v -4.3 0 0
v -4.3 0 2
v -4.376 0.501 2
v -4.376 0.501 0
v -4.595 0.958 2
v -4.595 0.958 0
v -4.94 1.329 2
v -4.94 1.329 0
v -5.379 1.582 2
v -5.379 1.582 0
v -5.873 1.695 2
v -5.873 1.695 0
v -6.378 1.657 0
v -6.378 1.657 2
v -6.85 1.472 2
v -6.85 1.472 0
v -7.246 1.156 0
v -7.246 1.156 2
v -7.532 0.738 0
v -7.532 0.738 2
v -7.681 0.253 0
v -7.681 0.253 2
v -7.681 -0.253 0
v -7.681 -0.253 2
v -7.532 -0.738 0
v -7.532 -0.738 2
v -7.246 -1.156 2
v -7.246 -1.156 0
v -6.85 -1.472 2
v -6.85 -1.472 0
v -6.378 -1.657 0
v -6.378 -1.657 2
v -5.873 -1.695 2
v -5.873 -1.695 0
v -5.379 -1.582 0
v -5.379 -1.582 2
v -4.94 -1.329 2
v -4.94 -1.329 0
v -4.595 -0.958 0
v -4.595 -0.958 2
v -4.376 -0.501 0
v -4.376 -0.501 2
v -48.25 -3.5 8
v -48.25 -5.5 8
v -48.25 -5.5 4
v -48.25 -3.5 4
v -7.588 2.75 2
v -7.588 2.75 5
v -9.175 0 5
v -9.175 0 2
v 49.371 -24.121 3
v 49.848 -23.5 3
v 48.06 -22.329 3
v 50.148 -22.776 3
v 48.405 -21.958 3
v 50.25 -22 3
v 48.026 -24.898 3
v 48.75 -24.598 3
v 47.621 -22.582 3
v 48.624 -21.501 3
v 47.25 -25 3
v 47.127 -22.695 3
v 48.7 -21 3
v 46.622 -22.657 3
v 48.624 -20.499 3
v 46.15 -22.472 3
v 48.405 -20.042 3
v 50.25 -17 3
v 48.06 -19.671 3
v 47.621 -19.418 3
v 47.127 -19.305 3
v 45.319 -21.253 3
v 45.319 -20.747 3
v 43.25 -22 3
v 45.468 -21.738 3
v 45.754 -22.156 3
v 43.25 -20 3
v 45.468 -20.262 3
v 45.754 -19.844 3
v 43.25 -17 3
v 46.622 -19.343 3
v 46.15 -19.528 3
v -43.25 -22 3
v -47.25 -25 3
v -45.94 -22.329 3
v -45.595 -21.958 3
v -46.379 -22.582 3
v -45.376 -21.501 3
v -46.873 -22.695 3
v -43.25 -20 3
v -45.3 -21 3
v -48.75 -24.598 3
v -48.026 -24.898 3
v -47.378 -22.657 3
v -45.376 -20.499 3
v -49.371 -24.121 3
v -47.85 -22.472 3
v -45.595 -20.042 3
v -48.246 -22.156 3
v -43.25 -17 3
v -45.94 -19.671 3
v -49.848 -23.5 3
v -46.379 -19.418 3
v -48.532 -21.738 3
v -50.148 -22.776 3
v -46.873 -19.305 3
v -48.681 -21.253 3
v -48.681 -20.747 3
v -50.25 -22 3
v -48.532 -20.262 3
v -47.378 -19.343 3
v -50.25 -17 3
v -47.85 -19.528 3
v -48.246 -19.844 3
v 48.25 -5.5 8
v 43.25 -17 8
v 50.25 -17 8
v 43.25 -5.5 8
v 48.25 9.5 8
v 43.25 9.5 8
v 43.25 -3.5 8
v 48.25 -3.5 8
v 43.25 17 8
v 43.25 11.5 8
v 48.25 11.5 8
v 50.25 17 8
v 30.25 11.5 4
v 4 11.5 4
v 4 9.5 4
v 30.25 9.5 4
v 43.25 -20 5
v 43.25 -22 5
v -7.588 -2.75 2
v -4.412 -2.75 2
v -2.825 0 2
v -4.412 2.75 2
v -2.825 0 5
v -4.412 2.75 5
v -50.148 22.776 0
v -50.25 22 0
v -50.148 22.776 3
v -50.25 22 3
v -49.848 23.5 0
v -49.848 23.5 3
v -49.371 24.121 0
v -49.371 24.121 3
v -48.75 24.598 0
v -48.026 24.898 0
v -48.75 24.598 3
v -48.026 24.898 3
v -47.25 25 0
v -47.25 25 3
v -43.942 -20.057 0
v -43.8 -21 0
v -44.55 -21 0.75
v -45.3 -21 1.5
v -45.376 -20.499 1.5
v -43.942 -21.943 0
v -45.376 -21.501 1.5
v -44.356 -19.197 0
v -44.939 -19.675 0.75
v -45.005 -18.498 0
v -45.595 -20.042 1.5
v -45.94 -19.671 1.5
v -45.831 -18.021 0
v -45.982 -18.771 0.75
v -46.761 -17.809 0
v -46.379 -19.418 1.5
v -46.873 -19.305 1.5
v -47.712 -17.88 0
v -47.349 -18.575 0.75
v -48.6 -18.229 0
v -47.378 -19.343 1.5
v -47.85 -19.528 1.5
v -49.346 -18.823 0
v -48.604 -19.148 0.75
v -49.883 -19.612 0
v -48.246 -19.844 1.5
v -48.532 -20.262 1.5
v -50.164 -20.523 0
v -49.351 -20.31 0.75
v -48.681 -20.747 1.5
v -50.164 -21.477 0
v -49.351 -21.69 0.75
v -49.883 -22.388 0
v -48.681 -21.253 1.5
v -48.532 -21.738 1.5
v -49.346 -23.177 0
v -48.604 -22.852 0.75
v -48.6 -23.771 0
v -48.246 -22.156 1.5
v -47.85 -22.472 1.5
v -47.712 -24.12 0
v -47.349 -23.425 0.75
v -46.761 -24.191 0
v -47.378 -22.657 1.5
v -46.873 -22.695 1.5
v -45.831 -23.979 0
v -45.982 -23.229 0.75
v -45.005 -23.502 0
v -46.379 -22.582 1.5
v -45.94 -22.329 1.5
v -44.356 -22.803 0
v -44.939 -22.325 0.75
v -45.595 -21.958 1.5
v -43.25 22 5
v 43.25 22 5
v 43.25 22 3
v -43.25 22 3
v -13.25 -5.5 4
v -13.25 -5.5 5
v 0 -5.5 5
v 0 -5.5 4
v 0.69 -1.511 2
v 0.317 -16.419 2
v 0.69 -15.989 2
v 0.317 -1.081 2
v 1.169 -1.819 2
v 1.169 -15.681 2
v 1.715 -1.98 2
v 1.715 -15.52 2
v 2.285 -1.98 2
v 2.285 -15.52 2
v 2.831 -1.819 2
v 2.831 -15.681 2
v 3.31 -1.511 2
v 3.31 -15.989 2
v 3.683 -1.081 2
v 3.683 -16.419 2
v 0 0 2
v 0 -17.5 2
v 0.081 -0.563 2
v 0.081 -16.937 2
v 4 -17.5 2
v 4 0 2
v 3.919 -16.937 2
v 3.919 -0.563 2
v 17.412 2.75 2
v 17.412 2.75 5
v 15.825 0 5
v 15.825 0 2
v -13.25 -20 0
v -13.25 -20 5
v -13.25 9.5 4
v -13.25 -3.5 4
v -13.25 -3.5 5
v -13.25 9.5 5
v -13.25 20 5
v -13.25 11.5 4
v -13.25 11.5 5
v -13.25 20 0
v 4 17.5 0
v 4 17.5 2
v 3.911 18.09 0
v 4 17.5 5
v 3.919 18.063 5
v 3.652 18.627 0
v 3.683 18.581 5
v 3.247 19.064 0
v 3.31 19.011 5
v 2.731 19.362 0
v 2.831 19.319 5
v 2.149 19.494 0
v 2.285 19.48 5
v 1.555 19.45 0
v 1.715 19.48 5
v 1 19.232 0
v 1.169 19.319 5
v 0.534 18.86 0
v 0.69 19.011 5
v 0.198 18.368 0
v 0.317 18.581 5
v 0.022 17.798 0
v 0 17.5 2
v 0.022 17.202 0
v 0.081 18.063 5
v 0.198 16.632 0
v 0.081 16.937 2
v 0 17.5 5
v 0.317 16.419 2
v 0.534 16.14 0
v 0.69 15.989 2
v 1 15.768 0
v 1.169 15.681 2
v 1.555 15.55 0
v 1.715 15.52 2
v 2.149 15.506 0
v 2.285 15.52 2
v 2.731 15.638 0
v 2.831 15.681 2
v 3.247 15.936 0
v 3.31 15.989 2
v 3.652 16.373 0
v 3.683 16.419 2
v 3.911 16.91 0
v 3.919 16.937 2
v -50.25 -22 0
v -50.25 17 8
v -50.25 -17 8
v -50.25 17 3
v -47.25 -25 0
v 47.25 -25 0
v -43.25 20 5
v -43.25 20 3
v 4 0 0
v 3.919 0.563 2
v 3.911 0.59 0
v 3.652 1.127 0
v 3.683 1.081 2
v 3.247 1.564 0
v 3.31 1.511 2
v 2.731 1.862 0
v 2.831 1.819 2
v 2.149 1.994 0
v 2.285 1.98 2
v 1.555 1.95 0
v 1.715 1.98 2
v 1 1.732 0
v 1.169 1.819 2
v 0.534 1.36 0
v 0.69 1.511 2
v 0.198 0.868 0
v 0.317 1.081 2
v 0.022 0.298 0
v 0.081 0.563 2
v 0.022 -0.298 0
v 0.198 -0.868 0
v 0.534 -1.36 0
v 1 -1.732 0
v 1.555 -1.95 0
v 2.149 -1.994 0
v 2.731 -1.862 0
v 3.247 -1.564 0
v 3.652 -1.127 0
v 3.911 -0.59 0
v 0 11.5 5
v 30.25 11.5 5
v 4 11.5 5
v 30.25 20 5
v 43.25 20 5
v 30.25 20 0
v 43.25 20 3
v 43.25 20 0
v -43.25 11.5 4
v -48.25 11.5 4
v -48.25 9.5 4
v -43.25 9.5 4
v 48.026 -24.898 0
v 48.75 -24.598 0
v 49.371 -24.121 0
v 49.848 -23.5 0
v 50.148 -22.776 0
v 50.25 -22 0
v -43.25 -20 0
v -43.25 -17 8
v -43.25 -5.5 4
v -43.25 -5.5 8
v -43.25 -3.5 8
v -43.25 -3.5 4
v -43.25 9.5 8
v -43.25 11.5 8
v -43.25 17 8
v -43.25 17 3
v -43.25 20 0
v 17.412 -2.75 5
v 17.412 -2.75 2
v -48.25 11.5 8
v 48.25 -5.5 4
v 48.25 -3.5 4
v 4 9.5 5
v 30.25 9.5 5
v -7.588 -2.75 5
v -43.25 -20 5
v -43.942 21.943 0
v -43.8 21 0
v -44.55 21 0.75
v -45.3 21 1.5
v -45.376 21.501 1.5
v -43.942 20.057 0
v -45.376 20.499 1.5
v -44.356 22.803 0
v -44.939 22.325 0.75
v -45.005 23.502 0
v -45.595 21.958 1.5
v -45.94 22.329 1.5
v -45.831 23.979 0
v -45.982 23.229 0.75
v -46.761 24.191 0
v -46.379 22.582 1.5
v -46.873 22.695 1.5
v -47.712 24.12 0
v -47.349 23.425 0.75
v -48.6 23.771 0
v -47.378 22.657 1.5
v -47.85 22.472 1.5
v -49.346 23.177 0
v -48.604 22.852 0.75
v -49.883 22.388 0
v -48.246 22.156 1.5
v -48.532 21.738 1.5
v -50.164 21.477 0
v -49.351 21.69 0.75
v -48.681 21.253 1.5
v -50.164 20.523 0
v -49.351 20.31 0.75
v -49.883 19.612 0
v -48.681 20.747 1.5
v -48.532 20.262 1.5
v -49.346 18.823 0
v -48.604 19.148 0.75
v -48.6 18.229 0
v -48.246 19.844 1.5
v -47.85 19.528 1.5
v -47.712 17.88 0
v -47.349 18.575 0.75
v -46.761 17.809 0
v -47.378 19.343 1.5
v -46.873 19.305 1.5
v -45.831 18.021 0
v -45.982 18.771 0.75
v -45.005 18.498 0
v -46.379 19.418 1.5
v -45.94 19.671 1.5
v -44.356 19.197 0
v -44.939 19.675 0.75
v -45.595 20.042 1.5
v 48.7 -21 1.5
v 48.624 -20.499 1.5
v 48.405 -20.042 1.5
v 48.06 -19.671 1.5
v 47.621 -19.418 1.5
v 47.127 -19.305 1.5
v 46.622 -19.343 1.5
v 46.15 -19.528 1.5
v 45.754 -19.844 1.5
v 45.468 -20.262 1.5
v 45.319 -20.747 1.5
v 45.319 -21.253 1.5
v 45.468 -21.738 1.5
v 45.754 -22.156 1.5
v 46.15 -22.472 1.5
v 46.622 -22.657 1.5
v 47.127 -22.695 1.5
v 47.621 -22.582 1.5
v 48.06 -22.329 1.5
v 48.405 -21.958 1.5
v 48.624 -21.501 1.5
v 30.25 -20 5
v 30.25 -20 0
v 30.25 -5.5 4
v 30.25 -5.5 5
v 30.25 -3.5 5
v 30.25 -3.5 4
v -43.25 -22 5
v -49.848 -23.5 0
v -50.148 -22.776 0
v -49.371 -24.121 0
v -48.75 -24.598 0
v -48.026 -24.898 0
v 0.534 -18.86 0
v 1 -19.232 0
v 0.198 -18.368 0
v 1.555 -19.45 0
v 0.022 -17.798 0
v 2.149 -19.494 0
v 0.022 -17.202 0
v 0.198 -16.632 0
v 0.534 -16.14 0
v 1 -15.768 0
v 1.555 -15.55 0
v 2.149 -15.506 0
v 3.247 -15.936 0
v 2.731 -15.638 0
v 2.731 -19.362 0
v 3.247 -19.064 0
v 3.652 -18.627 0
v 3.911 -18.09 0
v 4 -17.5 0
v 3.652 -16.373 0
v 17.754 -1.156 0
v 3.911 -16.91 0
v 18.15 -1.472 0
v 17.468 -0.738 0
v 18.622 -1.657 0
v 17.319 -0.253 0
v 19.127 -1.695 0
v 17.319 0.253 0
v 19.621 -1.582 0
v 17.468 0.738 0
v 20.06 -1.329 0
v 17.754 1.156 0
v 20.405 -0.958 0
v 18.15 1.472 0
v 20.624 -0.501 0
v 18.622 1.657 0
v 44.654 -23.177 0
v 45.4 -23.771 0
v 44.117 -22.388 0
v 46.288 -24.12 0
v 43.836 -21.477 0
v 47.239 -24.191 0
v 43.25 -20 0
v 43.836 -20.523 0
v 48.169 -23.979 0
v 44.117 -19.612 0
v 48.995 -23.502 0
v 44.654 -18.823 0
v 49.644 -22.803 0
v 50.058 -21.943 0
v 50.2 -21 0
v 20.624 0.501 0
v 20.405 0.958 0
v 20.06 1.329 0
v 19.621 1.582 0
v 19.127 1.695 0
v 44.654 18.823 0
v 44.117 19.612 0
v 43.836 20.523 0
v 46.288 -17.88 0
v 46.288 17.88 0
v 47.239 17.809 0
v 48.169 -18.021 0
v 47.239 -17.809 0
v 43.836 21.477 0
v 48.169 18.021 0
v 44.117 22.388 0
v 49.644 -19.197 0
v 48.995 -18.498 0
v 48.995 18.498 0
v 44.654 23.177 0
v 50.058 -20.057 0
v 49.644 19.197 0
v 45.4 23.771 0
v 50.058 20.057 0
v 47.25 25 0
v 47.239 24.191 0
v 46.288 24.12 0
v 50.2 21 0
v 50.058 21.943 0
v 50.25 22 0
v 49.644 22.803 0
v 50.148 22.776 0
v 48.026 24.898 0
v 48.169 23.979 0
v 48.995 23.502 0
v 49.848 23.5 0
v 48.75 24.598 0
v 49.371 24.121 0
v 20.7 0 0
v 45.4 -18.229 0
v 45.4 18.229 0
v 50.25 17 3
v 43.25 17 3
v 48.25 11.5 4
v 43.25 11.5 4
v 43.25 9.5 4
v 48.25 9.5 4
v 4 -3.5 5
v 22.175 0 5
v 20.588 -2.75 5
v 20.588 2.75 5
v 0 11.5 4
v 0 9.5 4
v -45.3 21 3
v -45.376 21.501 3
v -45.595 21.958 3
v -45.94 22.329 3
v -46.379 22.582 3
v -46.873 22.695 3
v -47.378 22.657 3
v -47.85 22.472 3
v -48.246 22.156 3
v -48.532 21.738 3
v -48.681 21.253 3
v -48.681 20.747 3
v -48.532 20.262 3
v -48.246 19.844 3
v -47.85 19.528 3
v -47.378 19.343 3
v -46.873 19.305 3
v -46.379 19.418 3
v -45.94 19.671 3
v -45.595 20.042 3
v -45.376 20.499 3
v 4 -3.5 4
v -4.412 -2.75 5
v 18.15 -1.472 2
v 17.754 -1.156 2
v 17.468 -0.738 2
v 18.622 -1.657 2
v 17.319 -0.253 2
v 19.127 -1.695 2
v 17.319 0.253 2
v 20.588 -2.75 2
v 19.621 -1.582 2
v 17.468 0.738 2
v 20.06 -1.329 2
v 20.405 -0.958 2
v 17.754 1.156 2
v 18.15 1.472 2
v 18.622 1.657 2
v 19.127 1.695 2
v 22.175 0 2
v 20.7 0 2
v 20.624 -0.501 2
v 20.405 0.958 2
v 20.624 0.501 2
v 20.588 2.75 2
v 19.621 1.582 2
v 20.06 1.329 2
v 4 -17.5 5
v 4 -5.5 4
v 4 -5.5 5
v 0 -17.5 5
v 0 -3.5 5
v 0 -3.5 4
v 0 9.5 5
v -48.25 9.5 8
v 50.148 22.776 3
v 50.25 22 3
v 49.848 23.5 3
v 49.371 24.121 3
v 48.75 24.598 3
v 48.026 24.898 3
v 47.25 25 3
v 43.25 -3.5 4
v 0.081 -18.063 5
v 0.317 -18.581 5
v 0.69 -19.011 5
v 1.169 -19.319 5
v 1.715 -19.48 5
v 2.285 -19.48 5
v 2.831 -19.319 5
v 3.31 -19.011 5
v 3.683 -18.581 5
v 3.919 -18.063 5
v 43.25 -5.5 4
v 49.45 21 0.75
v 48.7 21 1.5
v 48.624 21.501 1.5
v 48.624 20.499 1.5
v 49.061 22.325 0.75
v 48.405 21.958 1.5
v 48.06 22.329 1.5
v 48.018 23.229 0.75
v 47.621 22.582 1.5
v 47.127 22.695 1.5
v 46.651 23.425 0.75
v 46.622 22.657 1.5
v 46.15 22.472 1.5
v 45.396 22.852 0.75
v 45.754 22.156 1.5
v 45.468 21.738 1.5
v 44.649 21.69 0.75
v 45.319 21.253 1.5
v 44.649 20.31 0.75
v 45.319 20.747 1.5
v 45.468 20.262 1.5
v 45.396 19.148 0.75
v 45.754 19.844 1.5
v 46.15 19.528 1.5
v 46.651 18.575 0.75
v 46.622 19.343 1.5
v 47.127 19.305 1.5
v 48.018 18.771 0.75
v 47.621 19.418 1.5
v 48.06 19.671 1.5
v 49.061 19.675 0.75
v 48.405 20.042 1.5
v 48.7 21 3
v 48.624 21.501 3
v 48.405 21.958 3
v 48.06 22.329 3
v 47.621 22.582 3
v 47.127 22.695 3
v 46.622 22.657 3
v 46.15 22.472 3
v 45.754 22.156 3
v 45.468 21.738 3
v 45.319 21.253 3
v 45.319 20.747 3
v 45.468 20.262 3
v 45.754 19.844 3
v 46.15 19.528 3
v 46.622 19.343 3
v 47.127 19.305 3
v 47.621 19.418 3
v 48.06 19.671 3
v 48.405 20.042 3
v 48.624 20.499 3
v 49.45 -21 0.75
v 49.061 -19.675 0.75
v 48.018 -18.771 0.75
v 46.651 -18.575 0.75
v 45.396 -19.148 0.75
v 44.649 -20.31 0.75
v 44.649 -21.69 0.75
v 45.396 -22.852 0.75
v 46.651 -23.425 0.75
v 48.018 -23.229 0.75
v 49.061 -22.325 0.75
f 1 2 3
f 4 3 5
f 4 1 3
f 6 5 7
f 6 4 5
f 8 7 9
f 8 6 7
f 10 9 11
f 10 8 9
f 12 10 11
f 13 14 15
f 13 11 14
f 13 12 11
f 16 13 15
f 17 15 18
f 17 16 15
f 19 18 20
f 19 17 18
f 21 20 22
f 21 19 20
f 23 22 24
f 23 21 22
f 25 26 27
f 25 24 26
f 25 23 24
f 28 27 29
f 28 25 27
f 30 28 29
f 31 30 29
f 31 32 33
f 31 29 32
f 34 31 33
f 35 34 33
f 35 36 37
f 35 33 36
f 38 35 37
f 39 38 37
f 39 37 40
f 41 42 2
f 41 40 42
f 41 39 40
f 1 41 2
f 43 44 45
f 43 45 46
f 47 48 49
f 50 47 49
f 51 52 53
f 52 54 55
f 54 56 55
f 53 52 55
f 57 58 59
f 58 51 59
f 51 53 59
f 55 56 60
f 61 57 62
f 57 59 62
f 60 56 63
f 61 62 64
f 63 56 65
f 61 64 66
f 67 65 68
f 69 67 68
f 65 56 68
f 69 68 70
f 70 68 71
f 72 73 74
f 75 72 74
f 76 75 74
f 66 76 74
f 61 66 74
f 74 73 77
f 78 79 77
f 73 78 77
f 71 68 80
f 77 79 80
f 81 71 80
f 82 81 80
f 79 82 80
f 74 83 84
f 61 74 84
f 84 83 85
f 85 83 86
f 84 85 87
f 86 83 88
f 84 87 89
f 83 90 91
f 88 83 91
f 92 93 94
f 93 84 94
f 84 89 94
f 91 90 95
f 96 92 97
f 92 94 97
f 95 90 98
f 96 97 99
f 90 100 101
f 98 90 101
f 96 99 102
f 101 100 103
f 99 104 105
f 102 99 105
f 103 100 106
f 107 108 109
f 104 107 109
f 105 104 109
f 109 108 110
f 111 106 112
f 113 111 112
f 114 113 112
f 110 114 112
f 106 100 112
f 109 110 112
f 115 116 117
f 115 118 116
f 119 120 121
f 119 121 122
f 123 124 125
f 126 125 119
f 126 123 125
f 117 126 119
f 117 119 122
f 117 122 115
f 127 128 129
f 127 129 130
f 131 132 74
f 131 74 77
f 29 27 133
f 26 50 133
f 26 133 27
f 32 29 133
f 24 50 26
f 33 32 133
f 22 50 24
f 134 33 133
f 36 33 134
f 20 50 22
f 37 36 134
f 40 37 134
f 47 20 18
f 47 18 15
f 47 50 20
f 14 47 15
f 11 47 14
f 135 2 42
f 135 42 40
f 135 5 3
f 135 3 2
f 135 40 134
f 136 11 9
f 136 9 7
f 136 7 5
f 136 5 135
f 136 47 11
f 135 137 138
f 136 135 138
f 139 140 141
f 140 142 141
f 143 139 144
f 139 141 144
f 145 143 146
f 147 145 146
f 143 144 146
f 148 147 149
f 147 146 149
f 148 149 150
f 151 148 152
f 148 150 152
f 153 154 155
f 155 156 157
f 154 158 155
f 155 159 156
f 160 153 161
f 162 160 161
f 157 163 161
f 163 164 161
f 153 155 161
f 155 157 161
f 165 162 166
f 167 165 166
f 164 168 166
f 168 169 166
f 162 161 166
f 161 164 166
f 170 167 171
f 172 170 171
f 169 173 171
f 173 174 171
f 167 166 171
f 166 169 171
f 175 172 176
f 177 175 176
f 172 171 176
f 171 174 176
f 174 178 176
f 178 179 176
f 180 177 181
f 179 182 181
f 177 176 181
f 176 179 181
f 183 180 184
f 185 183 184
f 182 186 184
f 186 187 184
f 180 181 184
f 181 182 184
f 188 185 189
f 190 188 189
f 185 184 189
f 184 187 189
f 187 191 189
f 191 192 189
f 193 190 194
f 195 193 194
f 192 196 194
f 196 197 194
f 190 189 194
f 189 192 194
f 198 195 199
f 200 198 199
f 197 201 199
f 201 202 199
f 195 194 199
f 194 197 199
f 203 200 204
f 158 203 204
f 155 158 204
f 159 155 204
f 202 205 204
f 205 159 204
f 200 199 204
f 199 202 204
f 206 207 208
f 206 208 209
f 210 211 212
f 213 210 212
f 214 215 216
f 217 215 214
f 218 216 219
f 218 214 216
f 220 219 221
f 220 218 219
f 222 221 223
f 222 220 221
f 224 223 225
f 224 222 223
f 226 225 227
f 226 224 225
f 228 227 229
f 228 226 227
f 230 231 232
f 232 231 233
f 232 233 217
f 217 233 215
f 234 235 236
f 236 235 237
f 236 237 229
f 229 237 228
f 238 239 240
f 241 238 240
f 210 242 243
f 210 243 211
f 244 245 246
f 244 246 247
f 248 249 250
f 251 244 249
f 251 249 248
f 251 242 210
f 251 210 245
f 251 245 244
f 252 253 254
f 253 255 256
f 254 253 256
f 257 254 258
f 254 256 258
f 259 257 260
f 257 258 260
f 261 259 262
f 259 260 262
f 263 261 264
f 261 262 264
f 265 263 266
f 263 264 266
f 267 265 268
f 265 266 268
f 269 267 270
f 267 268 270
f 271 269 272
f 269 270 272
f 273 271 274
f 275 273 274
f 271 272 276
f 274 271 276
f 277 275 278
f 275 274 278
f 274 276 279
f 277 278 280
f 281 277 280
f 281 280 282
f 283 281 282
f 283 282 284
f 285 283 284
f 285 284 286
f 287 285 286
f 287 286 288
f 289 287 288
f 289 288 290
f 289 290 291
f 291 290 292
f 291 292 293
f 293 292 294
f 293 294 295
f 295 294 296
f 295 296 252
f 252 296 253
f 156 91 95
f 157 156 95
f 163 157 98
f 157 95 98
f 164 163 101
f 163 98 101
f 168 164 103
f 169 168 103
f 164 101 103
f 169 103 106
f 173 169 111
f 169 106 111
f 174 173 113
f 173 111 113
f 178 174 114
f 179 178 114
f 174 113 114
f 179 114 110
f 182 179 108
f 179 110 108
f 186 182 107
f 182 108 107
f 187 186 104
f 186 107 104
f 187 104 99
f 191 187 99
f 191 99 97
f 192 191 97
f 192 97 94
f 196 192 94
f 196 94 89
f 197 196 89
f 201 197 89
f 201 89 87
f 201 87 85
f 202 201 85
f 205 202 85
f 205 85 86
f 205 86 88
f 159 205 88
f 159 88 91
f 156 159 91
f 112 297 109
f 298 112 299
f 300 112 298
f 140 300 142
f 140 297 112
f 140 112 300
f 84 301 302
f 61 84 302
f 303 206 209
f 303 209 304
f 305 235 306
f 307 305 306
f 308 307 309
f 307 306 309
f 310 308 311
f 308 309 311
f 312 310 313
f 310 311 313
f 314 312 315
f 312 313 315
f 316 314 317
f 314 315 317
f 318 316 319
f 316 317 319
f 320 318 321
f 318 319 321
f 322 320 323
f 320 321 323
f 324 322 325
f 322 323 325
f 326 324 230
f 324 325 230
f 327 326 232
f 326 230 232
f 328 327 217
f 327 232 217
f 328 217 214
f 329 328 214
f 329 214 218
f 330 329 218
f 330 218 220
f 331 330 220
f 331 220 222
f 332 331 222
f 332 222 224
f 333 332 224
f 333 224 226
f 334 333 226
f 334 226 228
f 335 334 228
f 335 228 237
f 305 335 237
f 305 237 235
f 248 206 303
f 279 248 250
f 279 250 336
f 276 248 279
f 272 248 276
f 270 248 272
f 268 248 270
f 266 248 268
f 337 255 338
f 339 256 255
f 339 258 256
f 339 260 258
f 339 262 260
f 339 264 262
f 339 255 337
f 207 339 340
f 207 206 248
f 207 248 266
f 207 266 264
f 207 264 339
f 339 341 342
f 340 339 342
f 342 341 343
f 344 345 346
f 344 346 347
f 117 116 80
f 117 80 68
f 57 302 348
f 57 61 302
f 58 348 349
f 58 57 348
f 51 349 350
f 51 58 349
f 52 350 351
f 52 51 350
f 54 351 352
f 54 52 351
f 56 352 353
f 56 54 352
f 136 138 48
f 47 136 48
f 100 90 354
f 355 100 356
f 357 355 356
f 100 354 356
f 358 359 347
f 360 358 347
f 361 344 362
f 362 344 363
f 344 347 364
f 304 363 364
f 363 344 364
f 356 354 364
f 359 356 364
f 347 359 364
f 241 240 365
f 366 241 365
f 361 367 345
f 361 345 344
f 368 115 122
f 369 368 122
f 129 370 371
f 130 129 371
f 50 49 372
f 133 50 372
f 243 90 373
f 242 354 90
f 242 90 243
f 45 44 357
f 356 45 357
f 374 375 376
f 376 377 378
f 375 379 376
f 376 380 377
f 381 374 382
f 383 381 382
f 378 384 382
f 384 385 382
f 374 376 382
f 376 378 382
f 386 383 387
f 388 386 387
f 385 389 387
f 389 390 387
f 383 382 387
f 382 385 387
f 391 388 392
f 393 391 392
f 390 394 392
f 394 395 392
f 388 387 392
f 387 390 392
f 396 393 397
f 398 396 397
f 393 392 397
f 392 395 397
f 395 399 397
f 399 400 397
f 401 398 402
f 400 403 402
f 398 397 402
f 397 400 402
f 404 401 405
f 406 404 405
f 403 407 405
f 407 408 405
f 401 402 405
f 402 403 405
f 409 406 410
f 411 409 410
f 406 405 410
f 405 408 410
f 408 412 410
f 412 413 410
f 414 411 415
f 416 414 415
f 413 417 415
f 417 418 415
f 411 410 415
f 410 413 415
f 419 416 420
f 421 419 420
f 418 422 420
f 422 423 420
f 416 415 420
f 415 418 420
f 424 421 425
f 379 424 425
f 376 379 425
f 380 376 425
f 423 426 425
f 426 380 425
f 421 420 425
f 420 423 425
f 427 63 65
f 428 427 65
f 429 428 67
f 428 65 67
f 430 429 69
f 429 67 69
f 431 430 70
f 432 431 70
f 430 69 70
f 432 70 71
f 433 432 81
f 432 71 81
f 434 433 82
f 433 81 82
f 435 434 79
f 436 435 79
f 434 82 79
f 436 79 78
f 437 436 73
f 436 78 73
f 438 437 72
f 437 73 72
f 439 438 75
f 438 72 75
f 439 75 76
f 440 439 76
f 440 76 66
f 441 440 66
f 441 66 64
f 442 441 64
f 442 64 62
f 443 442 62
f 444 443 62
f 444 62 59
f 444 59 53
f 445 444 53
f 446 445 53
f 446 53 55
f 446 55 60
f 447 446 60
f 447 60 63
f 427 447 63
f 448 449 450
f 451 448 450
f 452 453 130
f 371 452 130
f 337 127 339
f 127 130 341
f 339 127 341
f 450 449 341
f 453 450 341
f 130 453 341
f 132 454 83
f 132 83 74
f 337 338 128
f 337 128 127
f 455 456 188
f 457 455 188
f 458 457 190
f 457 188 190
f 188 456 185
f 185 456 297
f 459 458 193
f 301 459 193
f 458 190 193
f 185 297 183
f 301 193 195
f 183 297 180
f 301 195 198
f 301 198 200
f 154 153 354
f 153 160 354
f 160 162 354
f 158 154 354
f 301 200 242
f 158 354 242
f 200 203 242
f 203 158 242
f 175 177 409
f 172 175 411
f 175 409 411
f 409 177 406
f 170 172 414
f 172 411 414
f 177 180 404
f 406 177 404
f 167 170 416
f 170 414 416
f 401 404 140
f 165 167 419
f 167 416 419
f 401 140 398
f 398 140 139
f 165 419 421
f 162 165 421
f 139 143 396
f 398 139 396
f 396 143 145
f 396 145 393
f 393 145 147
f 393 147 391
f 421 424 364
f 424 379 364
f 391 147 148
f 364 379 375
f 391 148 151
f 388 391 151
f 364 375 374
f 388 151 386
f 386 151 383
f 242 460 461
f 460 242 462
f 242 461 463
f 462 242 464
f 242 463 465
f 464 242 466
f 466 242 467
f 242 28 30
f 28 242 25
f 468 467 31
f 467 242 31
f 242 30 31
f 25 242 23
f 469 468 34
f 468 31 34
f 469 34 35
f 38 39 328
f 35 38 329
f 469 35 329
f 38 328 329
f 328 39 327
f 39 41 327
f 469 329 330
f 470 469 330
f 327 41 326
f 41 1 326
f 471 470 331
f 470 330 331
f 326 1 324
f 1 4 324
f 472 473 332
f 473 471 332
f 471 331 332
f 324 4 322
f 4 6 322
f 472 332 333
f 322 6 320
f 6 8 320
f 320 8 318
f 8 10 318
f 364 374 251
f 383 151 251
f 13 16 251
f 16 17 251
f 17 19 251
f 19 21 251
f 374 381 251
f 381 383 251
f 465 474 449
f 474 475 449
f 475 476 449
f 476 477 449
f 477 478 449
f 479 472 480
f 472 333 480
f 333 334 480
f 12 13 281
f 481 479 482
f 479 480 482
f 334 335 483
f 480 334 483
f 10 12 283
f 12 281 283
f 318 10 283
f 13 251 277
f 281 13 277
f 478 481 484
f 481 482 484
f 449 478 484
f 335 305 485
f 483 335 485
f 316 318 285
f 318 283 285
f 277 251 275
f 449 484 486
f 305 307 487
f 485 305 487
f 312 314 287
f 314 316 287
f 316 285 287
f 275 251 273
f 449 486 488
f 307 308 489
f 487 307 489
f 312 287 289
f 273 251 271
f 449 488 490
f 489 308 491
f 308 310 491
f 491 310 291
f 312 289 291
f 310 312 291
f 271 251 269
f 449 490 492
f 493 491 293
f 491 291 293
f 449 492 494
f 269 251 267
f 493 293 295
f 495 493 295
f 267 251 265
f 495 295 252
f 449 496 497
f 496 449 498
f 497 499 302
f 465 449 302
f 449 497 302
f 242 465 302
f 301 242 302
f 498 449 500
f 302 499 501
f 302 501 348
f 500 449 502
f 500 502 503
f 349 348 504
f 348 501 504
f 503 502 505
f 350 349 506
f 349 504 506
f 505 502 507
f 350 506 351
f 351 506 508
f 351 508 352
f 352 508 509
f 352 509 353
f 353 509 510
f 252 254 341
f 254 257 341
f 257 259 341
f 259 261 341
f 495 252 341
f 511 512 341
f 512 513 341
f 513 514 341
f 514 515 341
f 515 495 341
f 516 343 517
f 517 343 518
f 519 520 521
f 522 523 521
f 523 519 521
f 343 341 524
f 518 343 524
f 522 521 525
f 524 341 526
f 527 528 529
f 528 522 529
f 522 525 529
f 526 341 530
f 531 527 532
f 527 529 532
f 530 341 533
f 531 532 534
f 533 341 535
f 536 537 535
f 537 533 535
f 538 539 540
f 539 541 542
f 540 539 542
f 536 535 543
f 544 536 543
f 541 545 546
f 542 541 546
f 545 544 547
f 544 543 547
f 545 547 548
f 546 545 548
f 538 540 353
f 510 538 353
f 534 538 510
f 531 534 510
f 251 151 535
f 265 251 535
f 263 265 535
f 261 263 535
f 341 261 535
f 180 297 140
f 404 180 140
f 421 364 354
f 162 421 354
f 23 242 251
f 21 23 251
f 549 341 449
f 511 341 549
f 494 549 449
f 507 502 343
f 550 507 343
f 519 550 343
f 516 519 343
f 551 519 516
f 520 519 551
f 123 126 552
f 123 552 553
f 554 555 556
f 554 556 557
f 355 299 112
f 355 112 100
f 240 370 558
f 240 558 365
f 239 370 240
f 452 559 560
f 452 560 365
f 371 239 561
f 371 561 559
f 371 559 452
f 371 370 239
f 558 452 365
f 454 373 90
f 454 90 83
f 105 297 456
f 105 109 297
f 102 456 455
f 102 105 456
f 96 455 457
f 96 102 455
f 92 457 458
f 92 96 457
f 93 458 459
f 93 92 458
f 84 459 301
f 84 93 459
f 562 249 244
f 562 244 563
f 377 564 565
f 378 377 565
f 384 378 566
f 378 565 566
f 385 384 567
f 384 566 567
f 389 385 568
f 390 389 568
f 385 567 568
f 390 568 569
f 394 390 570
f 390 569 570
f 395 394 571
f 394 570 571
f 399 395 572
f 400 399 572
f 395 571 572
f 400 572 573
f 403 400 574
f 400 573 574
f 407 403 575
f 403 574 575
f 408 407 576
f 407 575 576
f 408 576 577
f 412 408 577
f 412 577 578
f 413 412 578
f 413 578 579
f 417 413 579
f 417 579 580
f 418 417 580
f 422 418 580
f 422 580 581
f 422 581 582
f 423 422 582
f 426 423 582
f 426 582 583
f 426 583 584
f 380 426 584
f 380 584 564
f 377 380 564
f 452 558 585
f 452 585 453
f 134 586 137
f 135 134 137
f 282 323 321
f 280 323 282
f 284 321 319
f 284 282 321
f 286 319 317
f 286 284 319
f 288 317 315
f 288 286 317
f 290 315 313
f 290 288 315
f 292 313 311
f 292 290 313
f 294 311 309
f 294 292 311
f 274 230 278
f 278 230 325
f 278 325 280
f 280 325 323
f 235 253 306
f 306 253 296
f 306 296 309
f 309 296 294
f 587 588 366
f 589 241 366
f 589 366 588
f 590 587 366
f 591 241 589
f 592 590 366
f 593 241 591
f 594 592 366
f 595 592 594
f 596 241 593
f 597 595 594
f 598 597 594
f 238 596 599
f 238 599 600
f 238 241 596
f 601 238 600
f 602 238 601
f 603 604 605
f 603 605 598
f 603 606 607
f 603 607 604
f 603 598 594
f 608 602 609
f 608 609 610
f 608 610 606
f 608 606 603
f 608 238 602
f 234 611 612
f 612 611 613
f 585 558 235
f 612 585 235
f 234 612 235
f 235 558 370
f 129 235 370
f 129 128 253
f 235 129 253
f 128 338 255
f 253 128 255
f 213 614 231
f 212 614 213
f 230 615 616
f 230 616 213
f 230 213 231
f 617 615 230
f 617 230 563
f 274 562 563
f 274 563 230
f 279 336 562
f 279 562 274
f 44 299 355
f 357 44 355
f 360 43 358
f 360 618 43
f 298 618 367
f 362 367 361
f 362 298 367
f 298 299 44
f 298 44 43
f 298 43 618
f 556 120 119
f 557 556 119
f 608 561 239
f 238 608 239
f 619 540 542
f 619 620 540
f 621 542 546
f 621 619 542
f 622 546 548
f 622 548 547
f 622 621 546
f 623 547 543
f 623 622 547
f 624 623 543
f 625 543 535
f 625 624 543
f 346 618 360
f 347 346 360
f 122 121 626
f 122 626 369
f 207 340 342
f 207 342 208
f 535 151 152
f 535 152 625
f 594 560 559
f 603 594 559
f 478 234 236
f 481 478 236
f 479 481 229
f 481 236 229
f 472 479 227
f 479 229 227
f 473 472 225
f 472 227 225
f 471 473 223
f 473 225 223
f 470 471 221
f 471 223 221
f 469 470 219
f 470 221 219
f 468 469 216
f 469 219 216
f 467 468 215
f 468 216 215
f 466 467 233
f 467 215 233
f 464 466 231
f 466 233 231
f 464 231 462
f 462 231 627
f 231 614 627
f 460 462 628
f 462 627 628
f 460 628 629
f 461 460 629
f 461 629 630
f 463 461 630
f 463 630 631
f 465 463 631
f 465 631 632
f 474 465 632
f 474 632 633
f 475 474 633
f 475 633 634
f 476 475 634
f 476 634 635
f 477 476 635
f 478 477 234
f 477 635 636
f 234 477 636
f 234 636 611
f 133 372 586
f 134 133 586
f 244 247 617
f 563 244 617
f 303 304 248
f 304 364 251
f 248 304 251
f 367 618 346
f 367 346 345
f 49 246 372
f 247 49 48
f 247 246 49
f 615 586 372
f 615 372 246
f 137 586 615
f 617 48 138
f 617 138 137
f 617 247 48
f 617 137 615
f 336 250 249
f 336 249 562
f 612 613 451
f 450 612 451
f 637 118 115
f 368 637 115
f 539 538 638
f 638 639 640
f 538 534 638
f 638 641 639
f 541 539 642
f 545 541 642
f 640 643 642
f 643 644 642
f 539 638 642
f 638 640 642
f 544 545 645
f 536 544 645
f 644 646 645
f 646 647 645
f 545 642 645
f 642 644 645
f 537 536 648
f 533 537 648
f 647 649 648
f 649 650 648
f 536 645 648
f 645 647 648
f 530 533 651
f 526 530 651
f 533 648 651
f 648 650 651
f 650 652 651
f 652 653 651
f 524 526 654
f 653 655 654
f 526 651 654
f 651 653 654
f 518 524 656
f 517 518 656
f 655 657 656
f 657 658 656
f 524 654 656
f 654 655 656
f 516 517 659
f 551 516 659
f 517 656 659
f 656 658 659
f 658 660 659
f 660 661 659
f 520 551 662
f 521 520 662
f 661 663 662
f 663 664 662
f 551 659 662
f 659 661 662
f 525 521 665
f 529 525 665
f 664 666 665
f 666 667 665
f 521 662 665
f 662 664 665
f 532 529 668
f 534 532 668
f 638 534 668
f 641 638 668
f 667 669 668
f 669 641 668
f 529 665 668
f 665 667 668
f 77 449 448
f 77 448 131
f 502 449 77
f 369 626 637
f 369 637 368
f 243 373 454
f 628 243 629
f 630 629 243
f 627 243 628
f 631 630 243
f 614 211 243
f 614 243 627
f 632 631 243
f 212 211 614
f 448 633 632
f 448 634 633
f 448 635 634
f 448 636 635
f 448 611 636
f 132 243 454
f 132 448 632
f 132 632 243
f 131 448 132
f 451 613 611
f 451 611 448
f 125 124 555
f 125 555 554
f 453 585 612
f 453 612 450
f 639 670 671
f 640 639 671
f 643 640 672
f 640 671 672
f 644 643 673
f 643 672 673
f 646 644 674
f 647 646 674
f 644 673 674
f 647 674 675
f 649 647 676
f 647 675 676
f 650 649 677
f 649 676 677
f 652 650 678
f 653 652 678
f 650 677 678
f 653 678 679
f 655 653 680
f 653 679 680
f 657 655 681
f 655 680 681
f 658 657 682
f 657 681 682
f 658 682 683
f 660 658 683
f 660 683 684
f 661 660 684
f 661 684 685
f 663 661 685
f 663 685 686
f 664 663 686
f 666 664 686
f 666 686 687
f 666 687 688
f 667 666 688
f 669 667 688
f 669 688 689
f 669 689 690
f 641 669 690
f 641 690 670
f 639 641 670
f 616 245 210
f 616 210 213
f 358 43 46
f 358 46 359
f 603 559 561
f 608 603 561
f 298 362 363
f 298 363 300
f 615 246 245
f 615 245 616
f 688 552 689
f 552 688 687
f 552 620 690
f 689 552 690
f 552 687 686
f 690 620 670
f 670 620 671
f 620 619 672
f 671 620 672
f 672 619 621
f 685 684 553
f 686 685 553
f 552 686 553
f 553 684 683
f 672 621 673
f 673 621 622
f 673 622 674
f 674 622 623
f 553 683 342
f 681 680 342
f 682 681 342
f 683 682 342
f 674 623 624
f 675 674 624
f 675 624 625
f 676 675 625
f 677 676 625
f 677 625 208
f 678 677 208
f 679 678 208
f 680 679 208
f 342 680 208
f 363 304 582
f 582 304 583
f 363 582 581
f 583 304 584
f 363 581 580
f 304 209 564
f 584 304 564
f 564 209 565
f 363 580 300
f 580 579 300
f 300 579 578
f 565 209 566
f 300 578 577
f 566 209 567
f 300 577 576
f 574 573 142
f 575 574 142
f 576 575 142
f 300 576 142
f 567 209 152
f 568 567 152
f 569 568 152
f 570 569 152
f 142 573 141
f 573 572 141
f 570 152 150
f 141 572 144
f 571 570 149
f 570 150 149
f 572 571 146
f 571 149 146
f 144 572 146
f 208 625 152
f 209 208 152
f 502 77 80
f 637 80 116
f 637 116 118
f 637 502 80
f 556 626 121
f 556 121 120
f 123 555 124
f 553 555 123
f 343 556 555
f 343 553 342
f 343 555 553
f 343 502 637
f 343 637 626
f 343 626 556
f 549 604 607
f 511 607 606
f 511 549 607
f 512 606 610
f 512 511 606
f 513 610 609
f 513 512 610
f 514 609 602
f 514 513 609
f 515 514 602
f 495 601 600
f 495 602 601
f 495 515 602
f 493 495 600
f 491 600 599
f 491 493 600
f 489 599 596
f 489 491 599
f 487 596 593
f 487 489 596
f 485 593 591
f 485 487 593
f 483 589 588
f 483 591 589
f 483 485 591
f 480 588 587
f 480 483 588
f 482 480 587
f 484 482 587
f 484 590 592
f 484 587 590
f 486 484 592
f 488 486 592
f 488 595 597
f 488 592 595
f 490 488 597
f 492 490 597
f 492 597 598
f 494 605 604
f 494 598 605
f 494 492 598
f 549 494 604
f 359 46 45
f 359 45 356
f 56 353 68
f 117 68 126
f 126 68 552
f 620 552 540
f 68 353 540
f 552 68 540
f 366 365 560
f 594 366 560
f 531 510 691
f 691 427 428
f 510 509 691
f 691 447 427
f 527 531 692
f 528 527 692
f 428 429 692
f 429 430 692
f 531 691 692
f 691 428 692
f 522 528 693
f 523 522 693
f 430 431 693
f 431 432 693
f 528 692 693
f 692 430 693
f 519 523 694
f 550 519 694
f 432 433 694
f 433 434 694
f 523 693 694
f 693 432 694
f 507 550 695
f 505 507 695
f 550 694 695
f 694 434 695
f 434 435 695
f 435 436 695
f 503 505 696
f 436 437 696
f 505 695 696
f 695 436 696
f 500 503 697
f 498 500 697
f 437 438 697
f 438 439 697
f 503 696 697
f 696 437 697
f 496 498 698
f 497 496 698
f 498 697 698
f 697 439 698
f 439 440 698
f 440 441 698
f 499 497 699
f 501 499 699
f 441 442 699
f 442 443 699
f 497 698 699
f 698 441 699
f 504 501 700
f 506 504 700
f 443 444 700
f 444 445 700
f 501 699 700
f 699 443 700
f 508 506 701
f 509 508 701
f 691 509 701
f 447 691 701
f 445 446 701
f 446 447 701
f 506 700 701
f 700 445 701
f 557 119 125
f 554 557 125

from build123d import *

# Parameters (mm, degrees)
SKETCH_W        = 100.5
SKETCH_H        = 50
SKETCH_R        = 1.7
SKETCH_W_2      = 30
SKETCH_H_2      = 40
SKETCH_W_3      = 13
PAD_DEPTH       = 8
SKETCH001_W     = 86.5
SKETCH001_H     = 44
POCKET_DEPTH    = 3
SKETCH002_W     = 96.5
SKETCH002_H     = 2
POCKET001_DEPTH = 4
POCKET003_DEPTH = 5
SKETCH005_R     = 1.7
POCKET004_DEPTH = 3.001
POCKET005_DEPTH = 3
FILLET_R        = 3
FILLET001_R     = 3
FILLET002_R     = 3
FILLET003_R     = 3
SKETCH007_W     = 4
SKETCH007_H     = 35
POCKET006_DEPTH = 3
SKETCH008_R     = 2
POCKET007_DEPTH = 5.001
CHAMFER_SIZE    = 1.5
CHAMFER001_SIZE = 1.5
CHAMFER002_SIZE = 1.5
CHAMFER003_SIZE = 1.5


with BuildPart() as part:
    # Sketch → Pad (new body)
    with BuildSketch(Plane.XY):
        Rectangle(SKETCH_W, SKETCH_H)
        with Locations((-6, 0)):
            Circle(SKETCH_R, mode=Mode.SUBTRACT)
        with Locations((19, 0)):
            Circle(SKETCH_R, mode=Mode.SUBTRACT)
        with Locations((-28.25, 0)):
            Rectangle(SKETCH_W_2, SKETCH_H_2, mode=Mode.SUBTRACT)
        with Locations((36.75, 0)):
            Rectangle(SKETCH_W_3, SKETCH_H_2, mode=Mode.SUBTRACT)
    extrude(amount=PAD_DEPTH)

    # Sketch001 → Pocket (cut)
    with BuildSketch(Plane.XY.offset(8)):
        Rectangle(SKETCH001_W, SKETCH001_H)
    extrude(amount=-POCKET_DEPTH, mode=Mode.SUBTRACT)

    # Sketch002 → Pocket001 (cut)
    with BuildSketch(Plane.XY.offset(8)):
        with Locations((0, 10.5)):
            Rectangle(SKETCH002_W, SKETCH002_H)
        with Locations((0, -4.5)):
            Rectangle(SKETCH002_W, SKETCH002_H)
    extrude(amount=-POCKET001_DEPTH, mode=Mode.SUBTRACT)

    # Sketch004 → Pocket003 (cut)
    with BuildSketch(Plane.XY.offset(8)):
        Polygon((-50.25, 25), (50.25, 25), (50.25, 17), (43.25, 17), (43.25, 22), (-43.25, 22), (-43.25, 17), (-50.25, 17), align=None)
        Polygon((50.25, -17), (50.25, -25), (-50.25, -25), (-50.25, -17), (-43.25, -17), (-43.25, -22), (43.25, -22), (43.25, -17), align=None)
    extrude(amount=-POCKET003_DEPTH, mode=Mode.SUBTRACT)

    # Sketch005 → Pocket004 (cut, through all)
    with BuildSketch(Plane.XY.offset(3)):
        with Locations((-47, 21)):
            Circle(SKETCH005_R)
        with Locations((47, 21)):
            Circle(SKETCH005_R)
        with Locations((47, -21)):
            Circle(SKETCH005_R)
        with Locations((-47, -21)):
            Circle(SKETCH005_R)
    extrude(amount=-POCKET004_DEPTH, mode=Mode.SUBTRACT)

    # Sketch006 → Pocket005 (cut)
    with BuildSketch(Plane.XY.offset(5)):
        Polygon((-7.587713, 2.75), (-9.175426, 0), (-7.587713, -2.75), (-4.412287, -2.75), (-2.824574, 0), (-4.412287, 2.75), align=None)
        Polygon((17.412287, 2.75), (15.824574, 0), (17.412287, -2.75), (20.587713, -2.75), (22.175426, 0), (20.587713, 2.75), align=None)
    extrude(amount=-POCKET005_DEPTH, mode=Mode.SUBTRACT)

    # Fillet
    fillet_edges = [part.edges().sort_by_distance(p)[0] for p in [
        (-50.25, -25, 1.5),
    ]]
    fillet(fillet_edges, radius=FILLET_R)

    # Fillet001
    fillet001_edges = [part.edges().sort_by_distance(p)[0] for p in [
        (-50.25, 25, 1.5),
    ]]
    fillet(fillet001_edges, radius=FILLET001_R)

    # Fillet002
    fillet002_edges = [part.edges().sort_by_distance(p)[0] for p in [
        (50.25, -25, 1.5),
    ]]
    fillet(fillet002_edges, radius=FILLET002_R)

    # Fillet003
    fillet003_edges = [part.edges().sort_by_distance(p)[0] for p in [
        (50.25, 25, 1.5),
    ]]
    fillet(fillet003_edges, radius=FILLET003_R)

    # Sketch007 → Pocket006 (cut)
    with BuildSketch(Plane.XY.offset(5)):
        with Locations((2, 0)):
            Rectangle(SKETCH007_W, SKETCH007_H)
    extrude(amount=-POCKET006_DEPTH, mode=Mode.SUBTRACT)

    # Sketch008 → Pocket007 (cut, through all)
    with BuildSketch(Plane.XY.offset(5)):
        with Locations((2, 17.5)):
            Circle(SKETCH008_R)
        with Locations((2, 0)):
            Circle(SKETCH008_R)
        with Locations((2, -17.5)):
            Circle(SKETCH008_R)
    extrude(amount=-POCKET007_DEPTH, mode=Mode.SUBTRACT)

    # Chamfer
    chamfer_edges = [part.edges().sort_by_distance(p)[0] for p in [
        (-48.7, 21, 0),
    ]]
    chamfer(chamfer_edges, length=CHAMFER_SIZE)

    # Chamfer001
    chamfer001_edges = [part.edges().sort_by_distance(p)[0] for p in [
        (-48.7, -21, 0),
    ]]
    chamfer(chamfer001_edges, length=CHAMFER001_SIZE)

    # Chamfer002
    chamfer002_edges = [part.edges().sort_by_distance(p)[0] for p in [
        (45.3, 21, 0),
    ]]
    chamfer(chamfer002_edges, length=CHAMFER002_SIZE)

    # Chamfer003
    chamfer003_edges = [part.edges().sort_by_distance(p)[0] for p in [
        (45.3, -21, 0),
    ]]
    chamfer(chamfer003_edges, length=CHAMFER003_SIZE)


solid = part.part
